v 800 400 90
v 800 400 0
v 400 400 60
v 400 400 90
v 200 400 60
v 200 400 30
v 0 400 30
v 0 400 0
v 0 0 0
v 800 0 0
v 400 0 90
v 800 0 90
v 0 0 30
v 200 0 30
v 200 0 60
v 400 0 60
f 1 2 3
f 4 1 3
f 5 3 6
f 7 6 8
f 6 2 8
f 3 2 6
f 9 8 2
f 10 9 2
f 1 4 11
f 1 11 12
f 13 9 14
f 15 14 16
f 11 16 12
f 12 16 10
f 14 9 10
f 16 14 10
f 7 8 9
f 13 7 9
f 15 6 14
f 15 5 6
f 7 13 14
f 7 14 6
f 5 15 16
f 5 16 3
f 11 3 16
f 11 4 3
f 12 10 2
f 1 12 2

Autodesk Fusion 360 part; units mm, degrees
sketch "Sketch1" plane through (0, 0, 0) normal (0, 0, 1) x (1, 0, 0)
  line L0 (0, 0) -> (800, 0)
  line L1 (800, 0) -> (800, 400)
  line L2 (800, 400) -> (0, 400)
  line L3 (0, 400) -> (0, 0)
  dimension "d1" = 800
  dimension "d2" = 400
extrude "Extrude1" add sketch "Sketch1" along normal blind 90
sketch "Sketch2" plane through (0, 0, 0) normal (-1, 0, 0) x (0, -1, 0)
  line L0 (-400, 0) -> (0, 0)
  line L1 (0, 0) -> (0, 90)
  line L2 (0, 90) -> (-400, 90)
  line L3 (-400, 90) -> (-400, 0)
  line L4 (-200, 90) -> (-200, 60) construction
  line L5 (-200, 60) -> (-200, 30) construction
  line L6 (-200, 30) -> (-200, 0) construction
  line L7 (-400, 90) -> (0, 90) construction
  line L8 (0, 90) -> (0, 60) construction
  line L9 (0, 60) -> (-400, 60)
  line L10 (-400, 60) -> (-400, 90) construction
  line L11 (-400, 60) -> (0, 60) construction
  line L12 (0, 60) -> (0, 30) construction
  line L13 (0, 30) -> (-400, 30)
  line L14 (-400, 30) -> (-400, 60) construction
  dimension "d5" = 30
  dimension "d6" = 30
extrude "Extrude2" cut sketch "Sketch2" against normal blind 400 contours L1 L2 L3 L9
extrude "Extrude3" cut sketch "Sketch2" against normal blind 200 contours L1 L3 L9 L13
